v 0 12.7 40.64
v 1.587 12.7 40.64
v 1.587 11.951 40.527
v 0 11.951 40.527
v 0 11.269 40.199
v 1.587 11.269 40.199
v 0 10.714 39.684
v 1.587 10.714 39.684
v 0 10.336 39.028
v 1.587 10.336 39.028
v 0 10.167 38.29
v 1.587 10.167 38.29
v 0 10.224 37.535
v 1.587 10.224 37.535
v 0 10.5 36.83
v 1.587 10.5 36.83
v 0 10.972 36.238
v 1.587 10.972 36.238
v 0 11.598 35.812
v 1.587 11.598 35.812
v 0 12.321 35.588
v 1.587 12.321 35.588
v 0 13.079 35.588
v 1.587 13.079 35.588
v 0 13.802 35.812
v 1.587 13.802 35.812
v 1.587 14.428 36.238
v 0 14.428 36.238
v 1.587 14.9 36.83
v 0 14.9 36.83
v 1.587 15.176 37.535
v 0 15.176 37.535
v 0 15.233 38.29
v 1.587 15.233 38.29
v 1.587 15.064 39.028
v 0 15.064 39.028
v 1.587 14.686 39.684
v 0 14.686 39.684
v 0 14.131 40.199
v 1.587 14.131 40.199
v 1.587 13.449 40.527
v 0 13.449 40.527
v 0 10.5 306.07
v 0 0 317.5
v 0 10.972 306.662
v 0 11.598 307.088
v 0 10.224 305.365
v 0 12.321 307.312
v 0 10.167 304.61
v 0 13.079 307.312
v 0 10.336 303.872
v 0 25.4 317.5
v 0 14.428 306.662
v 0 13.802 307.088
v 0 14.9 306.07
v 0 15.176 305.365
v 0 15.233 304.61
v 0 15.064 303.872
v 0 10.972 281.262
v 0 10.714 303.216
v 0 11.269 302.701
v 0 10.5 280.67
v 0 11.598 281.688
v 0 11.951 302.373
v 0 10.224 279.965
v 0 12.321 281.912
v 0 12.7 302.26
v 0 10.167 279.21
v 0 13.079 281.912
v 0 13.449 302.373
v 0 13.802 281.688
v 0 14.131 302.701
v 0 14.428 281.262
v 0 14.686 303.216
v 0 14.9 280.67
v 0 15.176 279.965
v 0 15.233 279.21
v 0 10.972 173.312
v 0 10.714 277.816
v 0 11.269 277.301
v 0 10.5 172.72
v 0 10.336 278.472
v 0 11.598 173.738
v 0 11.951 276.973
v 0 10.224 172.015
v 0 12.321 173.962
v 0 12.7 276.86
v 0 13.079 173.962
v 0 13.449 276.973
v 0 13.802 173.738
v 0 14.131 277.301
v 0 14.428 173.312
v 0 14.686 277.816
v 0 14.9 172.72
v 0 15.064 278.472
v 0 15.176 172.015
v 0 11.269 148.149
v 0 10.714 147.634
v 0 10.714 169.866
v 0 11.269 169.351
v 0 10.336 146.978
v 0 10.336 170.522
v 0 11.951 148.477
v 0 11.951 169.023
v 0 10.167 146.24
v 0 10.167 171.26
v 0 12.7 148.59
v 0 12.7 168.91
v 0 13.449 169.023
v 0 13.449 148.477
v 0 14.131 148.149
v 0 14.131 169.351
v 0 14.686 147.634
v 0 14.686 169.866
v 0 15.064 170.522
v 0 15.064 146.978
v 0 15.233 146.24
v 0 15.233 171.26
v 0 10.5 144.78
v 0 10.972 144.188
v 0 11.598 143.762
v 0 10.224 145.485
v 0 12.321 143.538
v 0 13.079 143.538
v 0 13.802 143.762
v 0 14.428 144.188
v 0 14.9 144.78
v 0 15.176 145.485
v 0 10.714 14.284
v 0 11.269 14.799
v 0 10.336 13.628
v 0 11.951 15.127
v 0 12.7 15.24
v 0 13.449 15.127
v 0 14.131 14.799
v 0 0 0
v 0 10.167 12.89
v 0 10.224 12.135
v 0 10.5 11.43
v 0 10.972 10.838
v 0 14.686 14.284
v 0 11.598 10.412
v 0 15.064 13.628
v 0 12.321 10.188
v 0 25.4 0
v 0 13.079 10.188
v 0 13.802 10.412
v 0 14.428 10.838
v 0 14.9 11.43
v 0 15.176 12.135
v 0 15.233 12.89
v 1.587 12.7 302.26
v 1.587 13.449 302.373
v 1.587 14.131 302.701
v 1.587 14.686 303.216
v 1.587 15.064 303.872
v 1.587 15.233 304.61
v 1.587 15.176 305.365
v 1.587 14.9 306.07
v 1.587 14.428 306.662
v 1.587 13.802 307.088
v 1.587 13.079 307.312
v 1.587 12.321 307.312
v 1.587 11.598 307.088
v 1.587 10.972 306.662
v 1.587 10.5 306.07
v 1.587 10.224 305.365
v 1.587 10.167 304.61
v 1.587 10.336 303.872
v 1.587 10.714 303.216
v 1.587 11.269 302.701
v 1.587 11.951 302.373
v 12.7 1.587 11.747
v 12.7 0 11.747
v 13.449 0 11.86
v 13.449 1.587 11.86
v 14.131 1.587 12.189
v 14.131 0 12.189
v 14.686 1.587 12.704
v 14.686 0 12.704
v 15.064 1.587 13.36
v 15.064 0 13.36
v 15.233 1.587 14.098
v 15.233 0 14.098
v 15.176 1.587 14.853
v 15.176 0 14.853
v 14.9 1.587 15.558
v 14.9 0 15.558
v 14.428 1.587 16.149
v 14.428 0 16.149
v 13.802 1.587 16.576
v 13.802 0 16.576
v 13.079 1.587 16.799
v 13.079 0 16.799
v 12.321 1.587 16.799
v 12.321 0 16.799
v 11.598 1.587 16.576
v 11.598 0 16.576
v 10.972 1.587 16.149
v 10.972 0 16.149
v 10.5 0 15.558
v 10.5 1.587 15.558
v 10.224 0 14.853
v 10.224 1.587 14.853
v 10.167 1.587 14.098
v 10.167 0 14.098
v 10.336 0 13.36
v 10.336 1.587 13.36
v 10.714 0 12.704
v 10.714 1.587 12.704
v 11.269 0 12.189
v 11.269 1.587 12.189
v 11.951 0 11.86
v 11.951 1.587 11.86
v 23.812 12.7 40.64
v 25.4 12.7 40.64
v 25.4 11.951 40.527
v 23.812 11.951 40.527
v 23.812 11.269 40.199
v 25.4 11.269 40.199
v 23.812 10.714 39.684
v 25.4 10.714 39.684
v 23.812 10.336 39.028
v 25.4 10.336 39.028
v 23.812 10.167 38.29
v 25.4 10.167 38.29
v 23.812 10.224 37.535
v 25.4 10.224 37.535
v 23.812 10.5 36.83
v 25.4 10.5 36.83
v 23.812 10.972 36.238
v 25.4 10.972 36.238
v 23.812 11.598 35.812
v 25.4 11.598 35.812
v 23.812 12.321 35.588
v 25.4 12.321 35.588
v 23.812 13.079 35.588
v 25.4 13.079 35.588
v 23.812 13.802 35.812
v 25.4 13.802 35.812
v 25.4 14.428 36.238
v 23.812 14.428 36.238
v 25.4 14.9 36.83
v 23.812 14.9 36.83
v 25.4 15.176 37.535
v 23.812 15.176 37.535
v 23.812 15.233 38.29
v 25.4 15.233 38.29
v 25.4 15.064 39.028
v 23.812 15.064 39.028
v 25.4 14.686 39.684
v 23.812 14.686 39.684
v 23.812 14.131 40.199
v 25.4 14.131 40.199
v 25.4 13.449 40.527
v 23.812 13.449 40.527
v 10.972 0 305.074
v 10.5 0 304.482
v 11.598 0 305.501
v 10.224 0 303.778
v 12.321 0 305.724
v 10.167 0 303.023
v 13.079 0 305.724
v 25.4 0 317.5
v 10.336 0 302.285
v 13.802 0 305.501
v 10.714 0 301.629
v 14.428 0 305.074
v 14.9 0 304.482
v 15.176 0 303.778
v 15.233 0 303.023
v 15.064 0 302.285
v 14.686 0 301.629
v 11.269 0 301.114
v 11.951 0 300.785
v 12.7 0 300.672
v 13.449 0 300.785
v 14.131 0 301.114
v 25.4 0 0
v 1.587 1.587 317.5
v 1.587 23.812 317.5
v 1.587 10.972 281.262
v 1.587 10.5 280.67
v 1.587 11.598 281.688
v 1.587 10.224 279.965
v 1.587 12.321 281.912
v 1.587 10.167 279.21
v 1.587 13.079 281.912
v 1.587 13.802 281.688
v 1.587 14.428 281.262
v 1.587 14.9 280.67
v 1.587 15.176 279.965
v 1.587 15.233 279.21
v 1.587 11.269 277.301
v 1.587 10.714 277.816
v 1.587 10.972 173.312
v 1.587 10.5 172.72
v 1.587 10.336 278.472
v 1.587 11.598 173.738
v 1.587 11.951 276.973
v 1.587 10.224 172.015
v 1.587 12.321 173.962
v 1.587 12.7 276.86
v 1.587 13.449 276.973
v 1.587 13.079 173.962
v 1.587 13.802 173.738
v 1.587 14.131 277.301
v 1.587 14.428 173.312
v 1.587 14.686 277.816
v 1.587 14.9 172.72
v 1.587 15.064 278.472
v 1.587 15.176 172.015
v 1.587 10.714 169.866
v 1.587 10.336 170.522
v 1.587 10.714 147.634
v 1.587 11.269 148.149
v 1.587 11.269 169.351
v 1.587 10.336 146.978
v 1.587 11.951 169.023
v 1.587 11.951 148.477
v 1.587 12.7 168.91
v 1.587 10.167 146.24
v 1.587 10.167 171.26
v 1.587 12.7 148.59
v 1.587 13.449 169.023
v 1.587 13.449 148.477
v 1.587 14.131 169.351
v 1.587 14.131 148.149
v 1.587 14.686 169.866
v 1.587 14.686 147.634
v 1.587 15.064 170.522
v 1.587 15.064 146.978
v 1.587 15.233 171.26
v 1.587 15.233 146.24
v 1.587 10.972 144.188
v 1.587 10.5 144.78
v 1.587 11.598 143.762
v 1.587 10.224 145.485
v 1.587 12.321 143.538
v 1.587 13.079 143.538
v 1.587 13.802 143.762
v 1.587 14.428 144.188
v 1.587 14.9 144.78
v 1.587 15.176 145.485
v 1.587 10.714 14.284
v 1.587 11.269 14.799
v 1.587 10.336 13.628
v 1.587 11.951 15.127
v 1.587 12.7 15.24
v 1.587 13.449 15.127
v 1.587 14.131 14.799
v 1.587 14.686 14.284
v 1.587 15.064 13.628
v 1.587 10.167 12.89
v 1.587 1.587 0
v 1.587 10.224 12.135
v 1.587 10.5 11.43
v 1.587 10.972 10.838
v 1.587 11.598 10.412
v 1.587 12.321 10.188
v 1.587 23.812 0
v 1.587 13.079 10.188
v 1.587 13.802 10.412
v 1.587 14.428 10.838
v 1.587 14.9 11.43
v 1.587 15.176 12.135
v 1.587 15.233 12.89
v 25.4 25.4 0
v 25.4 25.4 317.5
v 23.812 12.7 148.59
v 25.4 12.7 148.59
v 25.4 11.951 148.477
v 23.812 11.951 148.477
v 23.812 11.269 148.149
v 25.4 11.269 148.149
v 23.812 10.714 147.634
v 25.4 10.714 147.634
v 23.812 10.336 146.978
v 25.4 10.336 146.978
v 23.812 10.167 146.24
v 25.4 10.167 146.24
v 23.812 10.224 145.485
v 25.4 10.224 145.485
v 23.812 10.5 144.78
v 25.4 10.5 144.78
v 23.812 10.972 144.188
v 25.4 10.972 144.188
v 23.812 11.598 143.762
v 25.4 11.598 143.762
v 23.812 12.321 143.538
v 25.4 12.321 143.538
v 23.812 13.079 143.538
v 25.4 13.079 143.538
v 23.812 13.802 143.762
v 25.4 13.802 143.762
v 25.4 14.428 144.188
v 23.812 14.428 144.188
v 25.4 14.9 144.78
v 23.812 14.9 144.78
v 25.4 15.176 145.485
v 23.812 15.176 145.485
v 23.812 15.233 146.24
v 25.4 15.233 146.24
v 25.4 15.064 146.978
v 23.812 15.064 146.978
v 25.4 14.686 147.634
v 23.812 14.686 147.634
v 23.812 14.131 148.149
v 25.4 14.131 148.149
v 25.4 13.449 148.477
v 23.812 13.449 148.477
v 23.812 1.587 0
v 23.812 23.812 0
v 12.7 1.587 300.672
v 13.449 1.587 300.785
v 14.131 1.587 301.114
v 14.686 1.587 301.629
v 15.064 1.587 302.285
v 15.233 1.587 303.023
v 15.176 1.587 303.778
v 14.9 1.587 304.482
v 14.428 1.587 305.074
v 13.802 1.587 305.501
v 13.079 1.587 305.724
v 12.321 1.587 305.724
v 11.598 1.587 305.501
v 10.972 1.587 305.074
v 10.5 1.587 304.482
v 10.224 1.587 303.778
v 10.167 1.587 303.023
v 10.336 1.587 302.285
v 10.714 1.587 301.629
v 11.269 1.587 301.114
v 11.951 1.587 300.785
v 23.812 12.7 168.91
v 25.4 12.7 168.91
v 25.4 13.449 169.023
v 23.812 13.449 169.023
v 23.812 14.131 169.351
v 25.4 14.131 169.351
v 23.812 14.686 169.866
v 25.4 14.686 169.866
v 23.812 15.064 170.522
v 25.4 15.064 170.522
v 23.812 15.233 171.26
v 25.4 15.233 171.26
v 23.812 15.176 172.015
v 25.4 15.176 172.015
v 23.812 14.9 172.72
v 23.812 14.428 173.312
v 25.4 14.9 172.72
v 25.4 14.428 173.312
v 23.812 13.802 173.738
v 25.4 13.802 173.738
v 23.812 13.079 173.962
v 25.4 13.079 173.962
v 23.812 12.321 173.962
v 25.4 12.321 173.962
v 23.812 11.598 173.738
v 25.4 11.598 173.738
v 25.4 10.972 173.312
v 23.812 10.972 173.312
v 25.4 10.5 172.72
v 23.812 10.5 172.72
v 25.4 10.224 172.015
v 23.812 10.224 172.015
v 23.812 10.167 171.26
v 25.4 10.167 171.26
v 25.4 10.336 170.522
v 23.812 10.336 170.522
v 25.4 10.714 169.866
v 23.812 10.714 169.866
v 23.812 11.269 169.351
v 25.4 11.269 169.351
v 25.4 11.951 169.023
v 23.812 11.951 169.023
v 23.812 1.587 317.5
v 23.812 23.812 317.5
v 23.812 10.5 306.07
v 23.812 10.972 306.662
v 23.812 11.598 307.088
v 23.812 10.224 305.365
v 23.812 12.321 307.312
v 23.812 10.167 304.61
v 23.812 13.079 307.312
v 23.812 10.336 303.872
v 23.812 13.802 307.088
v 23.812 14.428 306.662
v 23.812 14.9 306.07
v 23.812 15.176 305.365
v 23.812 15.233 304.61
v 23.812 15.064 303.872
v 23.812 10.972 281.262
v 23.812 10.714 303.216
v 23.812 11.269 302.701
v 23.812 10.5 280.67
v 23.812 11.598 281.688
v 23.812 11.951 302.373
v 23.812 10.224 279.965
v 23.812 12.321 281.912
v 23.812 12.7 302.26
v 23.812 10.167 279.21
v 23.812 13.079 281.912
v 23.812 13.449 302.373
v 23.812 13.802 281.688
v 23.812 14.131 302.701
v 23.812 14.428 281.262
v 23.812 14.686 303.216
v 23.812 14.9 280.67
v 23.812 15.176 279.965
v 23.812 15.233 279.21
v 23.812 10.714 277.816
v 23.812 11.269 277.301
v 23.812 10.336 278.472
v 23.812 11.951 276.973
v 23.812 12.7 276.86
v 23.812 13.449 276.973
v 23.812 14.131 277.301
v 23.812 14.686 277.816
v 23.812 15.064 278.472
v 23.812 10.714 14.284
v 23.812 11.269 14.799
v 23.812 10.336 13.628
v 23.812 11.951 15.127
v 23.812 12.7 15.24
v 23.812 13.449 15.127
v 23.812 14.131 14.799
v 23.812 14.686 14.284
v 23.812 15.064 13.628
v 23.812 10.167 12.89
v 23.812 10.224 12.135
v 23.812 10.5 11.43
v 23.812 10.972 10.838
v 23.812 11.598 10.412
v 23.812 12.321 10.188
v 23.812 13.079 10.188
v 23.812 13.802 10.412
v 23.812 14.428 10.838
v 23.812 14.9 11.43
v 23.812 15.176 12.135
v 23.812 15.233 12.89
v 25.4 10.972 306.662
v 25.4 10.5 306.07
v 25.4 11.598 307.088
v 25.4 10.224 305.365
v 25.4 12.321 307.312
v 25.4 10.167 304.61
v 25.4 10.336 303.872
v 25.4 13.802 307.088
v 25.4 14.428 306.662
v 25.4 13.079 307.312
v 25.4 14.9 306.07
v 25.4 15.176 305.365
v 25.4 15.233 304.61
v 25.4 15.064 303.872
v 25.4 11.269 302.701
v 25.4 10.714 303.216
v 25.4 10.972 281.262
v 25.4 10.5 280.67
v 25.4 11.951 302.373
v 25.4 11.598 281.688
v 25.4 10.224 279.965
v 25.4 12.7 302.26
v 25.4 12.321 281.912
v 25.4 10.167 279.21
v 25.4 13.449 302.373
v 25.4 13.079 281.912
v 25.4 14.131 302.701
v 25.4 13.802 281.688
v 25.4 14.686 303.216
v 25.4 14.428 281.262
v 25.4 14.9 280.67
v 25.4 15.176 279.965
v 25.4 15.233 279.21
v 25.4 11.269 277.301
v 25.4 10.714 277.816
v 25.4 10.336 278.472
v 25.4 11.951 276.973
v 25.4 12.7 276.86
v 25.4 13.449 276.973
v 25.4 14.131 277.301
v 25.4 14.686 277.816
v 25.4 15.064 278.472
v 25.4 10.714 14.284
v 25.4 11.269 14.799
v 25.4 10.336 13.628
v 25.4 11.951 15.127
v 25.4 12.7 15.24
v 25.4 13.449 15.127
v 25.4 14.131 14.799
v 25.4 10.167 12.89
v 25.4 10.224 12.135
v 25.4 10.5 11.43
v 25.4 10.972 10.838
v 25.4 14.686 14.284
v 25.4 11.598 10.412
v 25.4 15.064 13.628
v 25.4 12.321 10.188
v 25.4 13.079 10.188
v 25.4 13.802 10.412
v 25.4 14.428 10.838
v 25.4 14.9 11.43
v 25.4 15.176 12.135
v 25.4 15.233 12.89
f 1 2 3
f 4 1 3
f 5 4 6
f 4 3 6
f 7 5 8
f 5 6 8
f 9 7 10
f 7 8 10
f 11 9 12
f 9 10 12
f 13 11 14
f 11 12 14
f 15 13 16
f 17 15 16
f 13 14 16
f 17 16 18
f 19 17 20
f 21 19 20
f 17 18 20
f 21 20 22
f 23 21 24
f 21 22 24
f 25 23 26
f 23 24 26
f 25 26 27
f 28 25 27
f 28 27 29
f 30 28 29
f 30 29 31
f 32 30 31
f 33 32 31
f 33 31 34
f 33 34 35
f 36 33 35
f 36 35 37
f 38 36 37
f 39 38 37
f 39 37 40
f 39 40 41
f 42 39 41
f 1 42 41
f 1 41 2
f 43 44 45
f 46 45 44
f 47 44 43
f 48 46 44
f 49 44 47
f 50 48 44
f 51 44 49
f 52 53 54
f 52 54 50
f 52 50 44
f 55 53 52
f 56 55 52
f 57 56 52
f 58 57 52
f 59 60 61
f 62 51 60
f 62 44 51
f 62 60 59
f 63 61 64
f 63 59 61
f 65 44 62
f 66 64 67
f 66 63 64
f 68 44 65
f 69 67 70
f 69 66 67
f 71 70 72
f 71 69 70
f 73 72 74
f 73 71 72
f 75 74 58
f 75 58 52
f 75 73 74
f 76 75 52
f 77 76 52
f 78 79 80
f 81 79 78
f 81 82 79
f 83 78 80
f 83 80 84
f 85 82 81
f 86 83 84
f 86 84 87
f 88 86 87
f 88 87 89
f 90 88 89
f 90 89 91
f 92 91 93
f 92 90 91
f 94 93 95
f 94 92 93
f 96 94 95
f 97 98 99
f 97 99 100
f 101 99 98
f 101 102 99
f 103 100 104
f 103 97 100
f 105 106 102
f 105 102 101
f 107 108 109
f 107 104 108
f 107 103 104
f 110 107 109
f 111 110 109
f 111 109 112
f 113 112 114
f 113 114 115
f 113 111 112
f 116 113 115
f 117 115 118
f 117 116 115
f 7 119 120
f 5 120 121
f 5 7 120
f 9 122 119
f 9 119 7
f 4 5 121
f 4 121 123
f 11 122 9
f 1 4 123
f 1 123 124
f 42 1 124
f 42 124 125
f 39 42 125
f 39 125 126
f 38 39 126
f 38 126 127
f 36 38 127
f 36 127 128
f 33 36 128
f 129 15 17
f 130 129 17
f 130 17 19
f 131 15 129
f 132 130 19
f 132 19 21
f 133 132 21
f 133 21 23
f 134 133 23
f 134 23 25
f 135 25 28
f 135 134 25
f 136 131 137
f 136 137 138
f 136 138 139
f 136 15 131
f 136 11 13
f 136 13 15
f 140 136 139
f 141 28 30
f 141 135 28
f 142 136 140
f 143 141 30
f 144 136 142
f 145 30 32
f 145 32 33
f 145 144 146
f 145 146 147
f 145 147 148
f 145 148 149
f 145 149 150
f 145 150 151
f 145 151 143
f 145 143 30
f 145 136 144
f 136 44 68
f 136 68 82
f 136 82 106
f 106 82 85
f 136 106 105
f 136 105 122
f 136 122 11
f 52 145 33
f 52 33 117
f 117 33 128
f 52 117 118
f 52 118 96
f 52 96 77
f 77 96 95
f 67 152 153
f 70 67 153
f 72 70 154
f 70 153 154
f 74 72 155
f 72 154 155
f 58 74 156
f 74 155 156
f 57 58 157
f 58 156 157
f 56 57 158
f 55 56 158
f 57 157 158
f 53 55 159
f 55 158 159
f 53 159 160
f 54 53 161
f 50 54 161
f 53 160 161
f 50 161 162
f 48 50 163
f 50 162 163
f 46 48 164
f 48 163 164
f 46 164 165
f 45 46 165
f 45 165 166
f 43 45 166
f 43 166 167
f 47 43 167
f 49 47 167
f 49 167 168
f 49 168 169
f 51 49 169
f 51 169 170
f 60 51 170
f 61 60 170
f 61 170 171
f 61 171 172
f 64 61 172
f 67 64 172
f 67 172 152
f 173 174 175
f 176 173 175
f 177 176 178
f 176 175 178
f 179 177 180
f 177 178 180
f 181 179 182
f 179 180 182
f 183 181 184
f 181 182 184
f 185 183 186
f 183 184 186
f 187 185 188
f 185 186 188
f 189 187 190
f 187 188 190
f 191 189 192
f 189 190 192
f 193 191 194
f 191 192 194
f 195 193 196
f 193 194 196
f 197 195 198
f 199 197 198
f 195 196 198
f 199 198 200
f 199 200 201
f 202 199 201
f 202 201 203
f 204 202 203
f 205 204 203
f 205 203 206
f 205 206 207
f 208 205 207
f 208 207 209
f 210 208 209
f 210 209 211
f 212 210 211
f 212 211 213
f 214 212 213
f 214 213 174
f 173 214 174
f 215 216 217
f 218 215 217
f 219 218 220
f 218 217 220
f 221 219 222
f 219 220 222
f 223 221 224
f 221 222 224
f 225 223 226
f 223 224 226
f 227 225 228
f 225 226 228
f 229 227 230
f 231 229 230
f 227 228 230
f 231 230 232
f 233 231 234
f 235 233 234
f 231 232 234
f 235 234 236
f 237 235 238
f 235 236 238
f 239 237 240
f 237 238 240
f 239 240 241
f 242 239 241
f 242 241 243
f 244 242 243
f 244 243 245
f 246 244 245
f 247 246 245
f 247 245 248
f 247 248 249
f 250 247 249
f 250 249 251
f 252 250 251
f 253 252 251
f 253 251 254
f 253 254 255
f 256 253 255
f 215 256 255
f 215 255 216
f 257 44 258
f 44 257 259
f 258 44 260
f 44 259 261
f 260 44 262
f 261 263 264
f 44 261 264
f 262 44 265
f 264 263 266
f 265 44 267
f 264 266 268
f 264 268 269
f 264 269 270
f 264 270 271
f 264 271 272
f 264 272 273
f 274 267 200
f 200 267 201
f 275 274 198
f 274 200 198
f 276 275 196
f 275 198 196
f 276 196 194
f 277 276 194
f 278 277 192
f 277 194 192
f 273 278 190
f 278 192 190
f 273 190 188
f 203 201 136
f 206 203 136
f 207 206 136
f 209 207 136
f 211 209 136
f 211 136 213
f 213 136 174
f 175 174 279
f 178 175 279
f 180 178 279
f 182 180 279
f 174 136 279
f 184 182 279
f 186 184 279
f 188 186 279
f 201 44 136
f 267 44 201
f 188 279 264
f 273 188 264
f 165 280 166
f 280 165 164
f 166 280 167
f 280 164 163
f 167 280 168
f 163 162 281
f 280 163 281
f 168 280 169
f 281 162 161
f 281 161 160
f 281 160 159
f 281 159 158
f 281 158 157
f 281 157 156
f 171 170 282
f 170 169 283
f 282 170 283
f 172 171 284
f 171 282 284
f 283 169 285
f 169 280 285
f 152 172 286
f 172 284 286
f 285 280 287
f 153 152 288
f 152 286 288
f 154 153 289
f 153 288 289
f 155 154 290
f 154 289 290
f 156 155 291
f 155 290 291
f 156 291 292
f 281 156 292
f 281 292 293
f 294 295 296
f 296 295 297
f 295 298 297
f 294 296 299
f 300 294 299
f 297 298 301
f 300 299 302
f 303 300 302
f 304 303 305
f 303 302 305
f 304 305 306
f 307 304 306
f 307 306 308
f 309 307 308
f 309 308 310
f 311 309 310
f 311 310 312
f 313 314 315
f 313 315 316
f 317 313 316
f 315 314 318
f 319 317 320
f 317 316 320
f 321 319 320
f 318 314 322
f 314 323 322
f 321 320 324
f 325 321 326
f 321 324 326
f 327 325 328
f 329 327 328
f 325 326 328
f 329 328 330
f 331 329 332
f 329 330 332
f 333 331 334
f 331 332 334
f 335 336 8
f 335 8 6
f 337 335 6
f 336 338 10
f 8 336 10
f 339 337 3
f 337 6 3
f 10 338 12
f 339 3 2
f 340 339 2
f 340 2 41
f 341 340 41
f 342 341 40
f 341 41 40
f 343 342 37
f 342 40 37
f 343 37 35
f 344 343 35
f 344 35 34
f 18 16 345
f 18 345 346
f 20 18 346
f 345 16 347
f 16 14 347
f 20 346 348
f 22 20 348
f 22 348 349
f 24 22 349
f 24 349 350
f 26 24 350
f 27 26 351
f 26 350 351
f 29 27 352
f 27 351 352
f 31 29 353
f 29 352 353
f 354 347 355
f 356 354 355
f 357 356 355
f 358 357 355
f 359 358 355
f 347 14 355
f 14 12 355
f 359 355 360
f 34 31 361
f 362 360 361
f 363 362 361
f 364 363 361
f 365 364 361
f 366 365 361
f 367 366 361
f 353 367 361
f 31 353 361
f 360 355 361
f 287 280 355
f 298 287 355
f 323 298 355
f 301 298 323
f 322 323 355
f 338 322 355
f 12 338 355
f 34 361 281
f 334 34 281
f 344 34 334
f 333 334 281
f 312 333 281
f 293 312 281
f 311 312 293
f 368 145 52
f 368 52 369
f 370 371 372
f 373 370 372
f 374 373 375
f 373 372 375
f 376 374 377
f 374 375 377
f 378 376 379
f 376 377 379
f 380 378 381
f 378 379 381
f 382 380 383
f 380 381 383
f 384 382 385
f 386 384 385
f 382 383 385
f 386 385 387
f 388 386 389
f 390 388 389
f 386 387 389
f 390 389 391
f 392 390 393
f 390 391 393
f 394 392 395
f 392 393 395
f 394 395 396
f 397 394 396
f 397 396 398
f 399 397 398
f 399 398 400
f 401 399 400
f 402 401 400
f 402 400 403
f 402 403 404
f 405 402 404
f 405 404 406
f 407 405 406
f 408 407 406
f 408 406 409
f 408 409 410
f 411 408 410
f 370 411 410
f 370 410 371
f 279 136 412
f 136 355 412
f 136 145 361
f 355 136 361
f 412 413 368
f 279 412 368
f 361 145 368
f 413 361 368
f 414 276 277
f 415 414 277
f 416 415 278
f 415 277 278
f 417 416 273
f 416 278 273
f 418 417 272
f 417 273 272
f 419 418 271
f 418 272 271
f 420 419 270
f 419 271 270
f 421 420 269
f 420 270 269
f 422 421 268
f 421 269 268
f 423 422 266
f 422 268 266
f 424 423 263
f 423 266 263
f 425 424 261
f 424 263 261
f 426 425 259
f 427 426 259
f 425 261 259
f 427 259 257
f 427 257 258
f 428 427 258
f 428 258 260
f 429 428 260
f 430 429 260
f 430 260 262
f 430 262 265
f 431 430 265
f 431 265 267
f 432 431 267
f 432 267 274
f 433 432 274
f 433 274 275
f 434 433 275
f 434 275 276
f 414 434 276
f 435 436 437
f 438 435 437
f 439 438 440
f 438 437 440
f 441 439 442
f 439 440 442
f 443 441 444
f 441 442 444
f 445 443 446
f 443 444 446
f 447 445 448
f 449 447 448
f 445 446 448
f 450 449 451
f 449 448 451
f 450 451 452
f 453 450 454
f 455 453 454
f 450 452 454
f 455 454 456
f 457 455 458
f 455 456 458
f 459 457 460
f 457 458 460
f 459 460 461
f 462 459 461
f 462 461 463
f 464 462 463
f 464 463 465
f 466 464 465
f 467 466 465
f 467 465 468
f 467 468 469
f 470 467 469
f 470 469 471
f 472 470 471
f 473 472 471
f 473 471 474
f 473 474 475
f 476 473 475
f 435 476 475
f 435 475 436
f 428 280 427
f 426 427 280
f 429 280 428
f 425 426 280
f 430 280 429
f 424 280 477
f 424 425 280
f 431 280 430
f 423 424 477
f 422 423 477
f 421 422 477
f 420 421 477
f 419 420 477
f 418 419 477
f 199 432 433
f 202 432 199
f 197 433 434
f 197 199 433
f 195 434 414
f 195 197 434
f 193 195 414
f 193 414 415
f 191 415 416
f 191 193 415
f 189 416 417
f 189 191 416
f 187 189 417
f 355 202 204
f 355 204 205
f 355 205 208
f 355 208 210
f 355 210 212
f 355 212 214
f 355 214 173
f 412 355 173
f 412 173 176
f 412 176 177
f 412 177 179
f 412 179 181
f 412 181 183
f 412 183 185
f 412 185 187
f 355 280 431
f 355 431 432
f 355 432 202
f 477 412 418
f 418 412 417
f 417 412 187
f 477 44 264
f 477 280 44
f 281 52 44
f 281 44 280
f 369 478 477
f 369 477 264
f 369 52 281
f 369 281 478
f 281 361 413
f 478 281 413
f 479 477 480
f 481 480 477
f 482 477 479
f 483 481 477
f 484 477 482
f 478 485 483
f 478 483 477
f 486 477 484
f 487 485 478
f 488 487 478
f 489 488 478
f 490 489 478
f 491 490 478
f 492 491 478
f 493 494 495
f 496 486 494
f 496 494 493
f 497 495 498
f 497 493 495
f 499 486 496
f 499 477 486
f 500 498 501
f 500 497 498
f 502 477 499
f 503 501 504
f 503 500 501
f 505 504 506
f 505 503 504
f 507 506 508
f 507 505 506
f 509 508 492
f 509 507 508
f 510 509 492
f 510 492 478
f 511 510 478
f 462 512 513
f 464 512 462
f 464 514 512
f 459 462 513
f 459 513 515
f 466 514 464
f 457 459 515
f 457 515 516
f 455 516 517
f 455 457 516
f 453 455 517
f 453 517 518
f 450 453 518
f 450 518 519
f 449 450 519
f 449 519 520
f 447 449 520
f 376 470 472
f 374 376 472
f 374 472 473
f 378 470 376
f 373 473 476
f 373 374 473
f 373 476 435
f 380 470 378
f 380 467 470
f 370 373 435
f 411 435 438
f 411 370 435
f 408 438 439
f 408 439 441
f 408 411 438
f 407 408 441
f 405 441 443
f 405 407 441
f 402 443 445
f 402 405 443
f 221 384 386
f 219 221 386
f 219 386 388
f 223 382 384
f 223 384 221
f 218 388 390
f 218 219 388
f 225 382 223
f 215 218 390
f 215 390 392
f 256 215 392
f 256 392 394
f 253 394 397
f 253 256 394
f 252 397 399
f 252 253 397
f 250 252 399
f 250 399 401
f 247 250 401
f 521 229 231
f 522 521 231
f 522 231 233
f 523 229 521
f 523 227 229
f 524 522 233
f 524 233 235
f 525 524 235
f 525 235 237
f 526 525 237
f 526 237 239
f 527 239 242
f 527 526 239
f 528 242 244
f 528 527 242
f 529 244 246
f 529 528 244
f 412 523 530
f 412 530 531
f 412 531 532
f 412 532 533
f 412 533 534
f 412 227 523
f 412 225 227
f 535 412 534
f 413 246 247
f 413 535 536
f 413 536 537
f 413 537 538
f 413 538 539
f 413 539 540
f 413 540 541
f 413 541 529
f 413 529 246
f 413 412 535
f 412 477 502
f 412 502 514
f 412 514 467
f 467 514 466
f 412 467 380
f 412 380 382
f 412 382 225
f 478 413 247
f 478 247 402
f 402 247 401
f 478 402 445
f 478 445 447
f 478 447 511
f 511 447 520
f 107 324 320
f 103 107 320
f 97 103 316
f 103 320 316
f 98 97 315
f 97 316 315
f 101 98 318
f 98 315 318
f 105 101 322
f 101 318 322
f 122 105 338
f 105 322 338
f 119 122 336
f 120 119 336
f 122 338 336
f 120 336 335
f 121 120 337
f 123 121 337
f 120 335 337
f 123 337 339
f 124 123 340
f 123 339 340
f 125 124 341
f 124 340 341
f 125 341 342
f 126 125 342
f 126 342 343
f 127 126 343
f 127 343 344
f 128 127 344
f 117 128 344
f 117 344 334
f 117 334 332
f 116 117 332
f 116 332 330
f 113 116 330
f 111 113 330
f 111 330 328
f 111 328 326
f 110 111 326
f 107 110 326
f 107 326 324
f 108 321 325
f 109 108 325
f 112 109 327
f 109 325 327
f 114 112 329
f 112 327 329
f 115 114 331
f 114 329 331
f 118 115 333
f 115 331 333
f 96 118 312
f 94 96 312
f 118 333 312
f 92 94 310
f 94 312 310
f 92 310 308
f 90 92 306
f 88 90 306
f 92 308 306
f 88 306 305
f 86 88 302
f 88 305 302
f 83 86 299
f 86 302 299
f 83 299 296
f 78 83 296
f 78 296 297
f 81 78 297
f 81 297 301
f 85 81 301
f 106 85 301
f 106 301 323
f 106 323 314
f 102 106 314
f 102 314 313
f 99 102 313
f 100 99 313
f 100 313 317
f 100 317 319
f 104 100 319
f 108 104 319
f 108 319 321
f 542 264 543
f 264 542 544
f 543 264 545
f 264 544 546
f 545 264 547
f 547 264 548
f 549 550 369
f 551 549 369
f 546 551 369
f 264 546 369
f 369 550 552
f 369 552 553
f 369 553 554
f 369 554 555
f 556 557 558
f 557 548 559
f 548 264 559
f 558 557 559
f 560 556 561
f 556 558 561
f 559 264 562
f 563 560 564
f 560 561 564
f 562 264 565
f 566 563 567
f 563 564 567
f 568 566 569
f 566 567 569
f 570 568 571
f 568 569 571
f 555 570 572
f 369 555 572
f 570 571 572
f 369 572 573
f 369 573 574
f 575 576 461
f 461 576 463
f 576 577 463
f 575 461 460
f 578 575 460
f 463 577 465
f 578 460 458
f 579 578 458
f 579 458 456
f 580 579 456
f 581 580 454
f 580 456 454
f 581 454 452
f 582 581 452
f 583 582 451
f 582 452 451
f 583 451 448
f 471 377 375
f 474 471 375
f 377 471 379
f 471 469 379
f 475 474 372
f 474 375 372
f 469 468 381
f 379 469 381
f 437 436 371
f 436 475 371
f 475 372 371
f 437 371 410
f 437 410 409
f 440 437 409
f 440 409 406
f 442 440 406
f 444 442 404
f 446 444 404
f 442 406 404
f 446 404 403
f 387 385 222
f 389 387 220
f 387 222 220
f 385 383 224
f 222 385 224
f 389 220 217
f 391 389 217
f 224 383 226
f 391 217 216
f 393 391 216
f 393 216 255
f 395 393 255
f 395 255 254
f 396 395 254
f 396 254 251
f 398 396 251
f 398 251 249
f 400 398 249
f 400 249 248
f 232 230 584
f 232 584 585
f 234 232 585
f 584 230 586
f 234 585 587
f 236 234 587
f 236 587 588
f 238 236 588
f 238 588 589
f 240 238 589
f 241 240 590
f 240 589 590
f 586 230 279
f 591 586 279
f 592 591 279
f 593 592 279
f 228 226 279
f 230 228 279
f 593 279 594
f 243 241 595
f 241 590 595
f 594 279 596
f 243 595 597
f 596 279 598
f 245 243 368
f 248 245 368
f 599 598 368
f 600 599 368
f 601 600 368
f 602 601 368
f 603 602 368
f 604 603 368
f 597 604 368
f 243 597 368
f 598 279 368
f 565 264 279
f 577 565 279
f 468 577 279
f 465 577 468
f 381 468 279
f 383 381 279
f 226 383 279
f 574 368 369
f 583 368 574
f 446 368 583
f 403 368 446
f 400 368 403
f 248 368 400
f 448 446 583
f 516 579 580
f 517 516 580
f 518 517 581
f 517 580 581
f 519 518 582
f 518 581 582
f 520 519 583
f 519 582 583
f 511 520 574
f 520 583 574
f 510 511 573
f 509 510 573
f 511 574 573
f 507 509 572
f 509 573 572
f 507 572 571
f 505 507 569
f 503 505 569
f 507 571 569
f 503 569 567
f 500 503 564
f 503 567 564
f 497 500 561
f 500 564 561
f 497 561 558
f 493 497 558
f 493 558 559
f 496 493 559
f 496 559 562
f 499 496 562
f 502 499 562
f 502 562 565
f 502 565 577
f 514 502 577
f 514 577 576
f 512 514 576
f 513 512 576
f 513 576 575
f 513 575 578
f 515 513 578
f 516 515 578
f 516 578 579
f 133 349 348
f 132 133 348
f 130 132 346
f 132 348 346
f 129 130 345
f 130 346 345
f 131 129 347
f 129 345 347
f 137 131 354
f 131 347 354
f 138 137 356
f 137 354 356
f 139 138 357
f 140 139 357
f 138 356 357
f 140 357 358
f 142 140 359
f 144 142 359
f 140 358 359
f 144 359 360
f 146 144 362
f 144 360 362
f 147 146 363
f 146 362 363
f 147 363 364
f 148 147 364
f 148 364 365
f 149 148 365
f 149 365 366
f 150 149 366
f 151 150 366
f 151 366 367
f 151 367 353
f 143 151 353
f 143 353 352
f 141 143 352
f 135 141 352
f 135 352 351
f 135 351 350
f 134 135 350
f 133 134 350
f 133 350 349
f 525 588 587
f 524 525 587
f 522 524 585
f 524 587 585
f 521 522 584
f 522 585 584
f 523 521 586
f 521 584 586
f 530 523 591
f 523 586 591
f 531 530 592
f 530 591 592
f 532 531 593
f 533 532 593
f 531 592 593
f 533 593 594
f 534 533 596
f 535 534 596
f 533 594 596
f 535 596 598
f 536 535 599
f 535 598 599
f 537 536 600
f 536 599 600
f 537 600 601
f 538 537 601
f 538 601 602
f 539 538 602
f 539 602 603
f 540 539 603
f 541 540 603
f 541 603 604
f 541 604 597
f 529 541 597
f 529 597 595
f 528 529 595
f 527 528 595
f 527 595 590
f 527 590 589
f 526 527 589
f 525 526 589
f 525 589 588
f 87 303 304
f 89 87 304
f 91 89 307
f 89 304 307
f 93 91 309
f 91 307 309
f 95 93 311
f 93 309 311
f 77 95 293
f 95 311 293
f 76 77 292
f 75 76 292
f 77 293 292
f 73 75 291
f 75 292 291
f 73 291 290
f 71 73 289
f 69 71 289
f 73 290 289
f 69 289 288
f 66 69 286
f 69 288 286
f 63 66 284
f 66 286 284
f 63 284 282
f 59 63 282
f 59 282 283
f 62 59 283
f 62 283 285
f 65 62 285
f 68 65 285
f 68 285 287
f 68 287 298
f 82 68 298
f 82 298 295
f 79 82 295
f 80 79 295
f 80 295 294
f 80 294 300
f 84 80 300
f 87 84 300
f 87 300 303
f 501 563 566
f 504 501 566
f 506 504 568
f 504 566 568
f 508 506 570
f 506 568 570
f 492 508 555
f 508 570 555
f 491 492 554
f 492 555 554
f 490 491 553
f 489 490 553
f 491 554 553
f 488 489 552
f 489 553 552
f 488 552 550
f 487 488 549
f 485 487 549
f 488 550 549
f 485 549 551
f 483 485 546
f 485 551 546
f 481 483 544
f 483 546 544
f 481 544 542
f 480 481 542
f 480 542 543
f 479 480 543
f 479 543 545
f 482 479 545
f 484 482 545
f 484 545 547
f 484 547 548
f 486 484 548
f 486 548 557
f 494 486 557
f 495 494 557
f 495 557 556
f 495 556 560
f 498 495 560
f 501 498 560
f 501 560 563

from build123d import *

# Parameters (mm, degrees)
SKETCH1_W           = 25.4
SKETCH1_H           = 25.4
SKETCH1_W_2         = 22.225
SKETCH1_H_2         = 22.225
BOSS_EXTRUDE1_DEPTH = 317.5
SKETCH4_R           = 2.54
CUT_EXTRUDE3_DEPTH  = 320.525538885
CUT_EXTRUDE4_REACH  = 321.526
SKETCH5_R           = 2.54


with BuildPart() as part:
    # Sketch1 → Boss-Extrude1 (new body)
    with BuildSketch(Plane.XY):
        with Locations((12.7, 12.7)):
            Rectangle(SKETCH1_W, SKETCH1_H)
        with Locations((12.7, 12.7)):
            Rectangle(SKETCH1_W_2, SKETCH1_H_2, mode=Mode.SUBTRACT)
    extrude(amount=BOSS_EXTRUDE1_DEPTH)

    # Sketch4 → Cut-Extrude3 (cut, through all)
    with BuildSketch(Plane(origin=(25.4, 0, 0), x_dir=(0, 0, -1), z_dir=(1, 0, 0))):
        with Locations((-304.8, 12.7)):
            Circle(SKETCH4_R)
        with Locations((-279.4, 12.7)):
            Circle(SKETCH4_R)
        with Locations(Location((-38.1, 12.7, 0), (0, 0, 180))):
            Circle(SKETCH4_R)
        with Locations(Location((-12.7, 12.7, 0), (0, 0, 180))):
            Circle(SKETCH4_R)
        with Locations((-171.45, 12.7)):
            Circle(SKETCH4_R)
        with Locations(Location((-146.05, 12.7, 0), (0, 0, 180))):
            Circle(SKETCH4_R)
    extrude(amount=-CUT_EXTRUDE3_DEPTH, mode=Mode.SUBTRACT)

    # Sketch5 → Cut-Extrude4 (cut, up to next)
    with BuildSketch(Plane.XZ, mode=Mode.PRIVATE) as cut_extrude4_sk1:
        with Locations(Location((12.7, 303.2125, 0), (0, 0, 270))):
            Circle(SKETCH5_R)
    cut_extrude4_tool1 = extrude(cut_extrude4_sk1.sketch, amount=-CUT_EXTRUDE4_REACH, mode=Mode.PRIVATE) & part.part
    # Sketch5 → Cut-Extrude4 (cut, up to next)
    with BuildSketch(Plane.XZ, mode=Mode.PRIVATE) as cut_extrude4_sk2:
        with Locations(Location((12.7, 14.2875, 0), (0, 0, 270))):
            Circle(SKETCH5_R)
    cut_extrude4_tool2 = extrude(cut_extrude4_sk2.sketch, amount=-CUT_EXTRUDE4_REACH, mode=Mode.PRIVATE) & part.part
    add(cut_extrude4_tool1.solids().sort_by_distance((12.7, 0, 303.2125))[0], mode=Mode.SUBTRACT)
    add(cut_extrude4_tool2.solids().sort_by_distance((12.7, 0, 14.2875))[0], mode=Mode.SUBTRACT)


solid = part.part
